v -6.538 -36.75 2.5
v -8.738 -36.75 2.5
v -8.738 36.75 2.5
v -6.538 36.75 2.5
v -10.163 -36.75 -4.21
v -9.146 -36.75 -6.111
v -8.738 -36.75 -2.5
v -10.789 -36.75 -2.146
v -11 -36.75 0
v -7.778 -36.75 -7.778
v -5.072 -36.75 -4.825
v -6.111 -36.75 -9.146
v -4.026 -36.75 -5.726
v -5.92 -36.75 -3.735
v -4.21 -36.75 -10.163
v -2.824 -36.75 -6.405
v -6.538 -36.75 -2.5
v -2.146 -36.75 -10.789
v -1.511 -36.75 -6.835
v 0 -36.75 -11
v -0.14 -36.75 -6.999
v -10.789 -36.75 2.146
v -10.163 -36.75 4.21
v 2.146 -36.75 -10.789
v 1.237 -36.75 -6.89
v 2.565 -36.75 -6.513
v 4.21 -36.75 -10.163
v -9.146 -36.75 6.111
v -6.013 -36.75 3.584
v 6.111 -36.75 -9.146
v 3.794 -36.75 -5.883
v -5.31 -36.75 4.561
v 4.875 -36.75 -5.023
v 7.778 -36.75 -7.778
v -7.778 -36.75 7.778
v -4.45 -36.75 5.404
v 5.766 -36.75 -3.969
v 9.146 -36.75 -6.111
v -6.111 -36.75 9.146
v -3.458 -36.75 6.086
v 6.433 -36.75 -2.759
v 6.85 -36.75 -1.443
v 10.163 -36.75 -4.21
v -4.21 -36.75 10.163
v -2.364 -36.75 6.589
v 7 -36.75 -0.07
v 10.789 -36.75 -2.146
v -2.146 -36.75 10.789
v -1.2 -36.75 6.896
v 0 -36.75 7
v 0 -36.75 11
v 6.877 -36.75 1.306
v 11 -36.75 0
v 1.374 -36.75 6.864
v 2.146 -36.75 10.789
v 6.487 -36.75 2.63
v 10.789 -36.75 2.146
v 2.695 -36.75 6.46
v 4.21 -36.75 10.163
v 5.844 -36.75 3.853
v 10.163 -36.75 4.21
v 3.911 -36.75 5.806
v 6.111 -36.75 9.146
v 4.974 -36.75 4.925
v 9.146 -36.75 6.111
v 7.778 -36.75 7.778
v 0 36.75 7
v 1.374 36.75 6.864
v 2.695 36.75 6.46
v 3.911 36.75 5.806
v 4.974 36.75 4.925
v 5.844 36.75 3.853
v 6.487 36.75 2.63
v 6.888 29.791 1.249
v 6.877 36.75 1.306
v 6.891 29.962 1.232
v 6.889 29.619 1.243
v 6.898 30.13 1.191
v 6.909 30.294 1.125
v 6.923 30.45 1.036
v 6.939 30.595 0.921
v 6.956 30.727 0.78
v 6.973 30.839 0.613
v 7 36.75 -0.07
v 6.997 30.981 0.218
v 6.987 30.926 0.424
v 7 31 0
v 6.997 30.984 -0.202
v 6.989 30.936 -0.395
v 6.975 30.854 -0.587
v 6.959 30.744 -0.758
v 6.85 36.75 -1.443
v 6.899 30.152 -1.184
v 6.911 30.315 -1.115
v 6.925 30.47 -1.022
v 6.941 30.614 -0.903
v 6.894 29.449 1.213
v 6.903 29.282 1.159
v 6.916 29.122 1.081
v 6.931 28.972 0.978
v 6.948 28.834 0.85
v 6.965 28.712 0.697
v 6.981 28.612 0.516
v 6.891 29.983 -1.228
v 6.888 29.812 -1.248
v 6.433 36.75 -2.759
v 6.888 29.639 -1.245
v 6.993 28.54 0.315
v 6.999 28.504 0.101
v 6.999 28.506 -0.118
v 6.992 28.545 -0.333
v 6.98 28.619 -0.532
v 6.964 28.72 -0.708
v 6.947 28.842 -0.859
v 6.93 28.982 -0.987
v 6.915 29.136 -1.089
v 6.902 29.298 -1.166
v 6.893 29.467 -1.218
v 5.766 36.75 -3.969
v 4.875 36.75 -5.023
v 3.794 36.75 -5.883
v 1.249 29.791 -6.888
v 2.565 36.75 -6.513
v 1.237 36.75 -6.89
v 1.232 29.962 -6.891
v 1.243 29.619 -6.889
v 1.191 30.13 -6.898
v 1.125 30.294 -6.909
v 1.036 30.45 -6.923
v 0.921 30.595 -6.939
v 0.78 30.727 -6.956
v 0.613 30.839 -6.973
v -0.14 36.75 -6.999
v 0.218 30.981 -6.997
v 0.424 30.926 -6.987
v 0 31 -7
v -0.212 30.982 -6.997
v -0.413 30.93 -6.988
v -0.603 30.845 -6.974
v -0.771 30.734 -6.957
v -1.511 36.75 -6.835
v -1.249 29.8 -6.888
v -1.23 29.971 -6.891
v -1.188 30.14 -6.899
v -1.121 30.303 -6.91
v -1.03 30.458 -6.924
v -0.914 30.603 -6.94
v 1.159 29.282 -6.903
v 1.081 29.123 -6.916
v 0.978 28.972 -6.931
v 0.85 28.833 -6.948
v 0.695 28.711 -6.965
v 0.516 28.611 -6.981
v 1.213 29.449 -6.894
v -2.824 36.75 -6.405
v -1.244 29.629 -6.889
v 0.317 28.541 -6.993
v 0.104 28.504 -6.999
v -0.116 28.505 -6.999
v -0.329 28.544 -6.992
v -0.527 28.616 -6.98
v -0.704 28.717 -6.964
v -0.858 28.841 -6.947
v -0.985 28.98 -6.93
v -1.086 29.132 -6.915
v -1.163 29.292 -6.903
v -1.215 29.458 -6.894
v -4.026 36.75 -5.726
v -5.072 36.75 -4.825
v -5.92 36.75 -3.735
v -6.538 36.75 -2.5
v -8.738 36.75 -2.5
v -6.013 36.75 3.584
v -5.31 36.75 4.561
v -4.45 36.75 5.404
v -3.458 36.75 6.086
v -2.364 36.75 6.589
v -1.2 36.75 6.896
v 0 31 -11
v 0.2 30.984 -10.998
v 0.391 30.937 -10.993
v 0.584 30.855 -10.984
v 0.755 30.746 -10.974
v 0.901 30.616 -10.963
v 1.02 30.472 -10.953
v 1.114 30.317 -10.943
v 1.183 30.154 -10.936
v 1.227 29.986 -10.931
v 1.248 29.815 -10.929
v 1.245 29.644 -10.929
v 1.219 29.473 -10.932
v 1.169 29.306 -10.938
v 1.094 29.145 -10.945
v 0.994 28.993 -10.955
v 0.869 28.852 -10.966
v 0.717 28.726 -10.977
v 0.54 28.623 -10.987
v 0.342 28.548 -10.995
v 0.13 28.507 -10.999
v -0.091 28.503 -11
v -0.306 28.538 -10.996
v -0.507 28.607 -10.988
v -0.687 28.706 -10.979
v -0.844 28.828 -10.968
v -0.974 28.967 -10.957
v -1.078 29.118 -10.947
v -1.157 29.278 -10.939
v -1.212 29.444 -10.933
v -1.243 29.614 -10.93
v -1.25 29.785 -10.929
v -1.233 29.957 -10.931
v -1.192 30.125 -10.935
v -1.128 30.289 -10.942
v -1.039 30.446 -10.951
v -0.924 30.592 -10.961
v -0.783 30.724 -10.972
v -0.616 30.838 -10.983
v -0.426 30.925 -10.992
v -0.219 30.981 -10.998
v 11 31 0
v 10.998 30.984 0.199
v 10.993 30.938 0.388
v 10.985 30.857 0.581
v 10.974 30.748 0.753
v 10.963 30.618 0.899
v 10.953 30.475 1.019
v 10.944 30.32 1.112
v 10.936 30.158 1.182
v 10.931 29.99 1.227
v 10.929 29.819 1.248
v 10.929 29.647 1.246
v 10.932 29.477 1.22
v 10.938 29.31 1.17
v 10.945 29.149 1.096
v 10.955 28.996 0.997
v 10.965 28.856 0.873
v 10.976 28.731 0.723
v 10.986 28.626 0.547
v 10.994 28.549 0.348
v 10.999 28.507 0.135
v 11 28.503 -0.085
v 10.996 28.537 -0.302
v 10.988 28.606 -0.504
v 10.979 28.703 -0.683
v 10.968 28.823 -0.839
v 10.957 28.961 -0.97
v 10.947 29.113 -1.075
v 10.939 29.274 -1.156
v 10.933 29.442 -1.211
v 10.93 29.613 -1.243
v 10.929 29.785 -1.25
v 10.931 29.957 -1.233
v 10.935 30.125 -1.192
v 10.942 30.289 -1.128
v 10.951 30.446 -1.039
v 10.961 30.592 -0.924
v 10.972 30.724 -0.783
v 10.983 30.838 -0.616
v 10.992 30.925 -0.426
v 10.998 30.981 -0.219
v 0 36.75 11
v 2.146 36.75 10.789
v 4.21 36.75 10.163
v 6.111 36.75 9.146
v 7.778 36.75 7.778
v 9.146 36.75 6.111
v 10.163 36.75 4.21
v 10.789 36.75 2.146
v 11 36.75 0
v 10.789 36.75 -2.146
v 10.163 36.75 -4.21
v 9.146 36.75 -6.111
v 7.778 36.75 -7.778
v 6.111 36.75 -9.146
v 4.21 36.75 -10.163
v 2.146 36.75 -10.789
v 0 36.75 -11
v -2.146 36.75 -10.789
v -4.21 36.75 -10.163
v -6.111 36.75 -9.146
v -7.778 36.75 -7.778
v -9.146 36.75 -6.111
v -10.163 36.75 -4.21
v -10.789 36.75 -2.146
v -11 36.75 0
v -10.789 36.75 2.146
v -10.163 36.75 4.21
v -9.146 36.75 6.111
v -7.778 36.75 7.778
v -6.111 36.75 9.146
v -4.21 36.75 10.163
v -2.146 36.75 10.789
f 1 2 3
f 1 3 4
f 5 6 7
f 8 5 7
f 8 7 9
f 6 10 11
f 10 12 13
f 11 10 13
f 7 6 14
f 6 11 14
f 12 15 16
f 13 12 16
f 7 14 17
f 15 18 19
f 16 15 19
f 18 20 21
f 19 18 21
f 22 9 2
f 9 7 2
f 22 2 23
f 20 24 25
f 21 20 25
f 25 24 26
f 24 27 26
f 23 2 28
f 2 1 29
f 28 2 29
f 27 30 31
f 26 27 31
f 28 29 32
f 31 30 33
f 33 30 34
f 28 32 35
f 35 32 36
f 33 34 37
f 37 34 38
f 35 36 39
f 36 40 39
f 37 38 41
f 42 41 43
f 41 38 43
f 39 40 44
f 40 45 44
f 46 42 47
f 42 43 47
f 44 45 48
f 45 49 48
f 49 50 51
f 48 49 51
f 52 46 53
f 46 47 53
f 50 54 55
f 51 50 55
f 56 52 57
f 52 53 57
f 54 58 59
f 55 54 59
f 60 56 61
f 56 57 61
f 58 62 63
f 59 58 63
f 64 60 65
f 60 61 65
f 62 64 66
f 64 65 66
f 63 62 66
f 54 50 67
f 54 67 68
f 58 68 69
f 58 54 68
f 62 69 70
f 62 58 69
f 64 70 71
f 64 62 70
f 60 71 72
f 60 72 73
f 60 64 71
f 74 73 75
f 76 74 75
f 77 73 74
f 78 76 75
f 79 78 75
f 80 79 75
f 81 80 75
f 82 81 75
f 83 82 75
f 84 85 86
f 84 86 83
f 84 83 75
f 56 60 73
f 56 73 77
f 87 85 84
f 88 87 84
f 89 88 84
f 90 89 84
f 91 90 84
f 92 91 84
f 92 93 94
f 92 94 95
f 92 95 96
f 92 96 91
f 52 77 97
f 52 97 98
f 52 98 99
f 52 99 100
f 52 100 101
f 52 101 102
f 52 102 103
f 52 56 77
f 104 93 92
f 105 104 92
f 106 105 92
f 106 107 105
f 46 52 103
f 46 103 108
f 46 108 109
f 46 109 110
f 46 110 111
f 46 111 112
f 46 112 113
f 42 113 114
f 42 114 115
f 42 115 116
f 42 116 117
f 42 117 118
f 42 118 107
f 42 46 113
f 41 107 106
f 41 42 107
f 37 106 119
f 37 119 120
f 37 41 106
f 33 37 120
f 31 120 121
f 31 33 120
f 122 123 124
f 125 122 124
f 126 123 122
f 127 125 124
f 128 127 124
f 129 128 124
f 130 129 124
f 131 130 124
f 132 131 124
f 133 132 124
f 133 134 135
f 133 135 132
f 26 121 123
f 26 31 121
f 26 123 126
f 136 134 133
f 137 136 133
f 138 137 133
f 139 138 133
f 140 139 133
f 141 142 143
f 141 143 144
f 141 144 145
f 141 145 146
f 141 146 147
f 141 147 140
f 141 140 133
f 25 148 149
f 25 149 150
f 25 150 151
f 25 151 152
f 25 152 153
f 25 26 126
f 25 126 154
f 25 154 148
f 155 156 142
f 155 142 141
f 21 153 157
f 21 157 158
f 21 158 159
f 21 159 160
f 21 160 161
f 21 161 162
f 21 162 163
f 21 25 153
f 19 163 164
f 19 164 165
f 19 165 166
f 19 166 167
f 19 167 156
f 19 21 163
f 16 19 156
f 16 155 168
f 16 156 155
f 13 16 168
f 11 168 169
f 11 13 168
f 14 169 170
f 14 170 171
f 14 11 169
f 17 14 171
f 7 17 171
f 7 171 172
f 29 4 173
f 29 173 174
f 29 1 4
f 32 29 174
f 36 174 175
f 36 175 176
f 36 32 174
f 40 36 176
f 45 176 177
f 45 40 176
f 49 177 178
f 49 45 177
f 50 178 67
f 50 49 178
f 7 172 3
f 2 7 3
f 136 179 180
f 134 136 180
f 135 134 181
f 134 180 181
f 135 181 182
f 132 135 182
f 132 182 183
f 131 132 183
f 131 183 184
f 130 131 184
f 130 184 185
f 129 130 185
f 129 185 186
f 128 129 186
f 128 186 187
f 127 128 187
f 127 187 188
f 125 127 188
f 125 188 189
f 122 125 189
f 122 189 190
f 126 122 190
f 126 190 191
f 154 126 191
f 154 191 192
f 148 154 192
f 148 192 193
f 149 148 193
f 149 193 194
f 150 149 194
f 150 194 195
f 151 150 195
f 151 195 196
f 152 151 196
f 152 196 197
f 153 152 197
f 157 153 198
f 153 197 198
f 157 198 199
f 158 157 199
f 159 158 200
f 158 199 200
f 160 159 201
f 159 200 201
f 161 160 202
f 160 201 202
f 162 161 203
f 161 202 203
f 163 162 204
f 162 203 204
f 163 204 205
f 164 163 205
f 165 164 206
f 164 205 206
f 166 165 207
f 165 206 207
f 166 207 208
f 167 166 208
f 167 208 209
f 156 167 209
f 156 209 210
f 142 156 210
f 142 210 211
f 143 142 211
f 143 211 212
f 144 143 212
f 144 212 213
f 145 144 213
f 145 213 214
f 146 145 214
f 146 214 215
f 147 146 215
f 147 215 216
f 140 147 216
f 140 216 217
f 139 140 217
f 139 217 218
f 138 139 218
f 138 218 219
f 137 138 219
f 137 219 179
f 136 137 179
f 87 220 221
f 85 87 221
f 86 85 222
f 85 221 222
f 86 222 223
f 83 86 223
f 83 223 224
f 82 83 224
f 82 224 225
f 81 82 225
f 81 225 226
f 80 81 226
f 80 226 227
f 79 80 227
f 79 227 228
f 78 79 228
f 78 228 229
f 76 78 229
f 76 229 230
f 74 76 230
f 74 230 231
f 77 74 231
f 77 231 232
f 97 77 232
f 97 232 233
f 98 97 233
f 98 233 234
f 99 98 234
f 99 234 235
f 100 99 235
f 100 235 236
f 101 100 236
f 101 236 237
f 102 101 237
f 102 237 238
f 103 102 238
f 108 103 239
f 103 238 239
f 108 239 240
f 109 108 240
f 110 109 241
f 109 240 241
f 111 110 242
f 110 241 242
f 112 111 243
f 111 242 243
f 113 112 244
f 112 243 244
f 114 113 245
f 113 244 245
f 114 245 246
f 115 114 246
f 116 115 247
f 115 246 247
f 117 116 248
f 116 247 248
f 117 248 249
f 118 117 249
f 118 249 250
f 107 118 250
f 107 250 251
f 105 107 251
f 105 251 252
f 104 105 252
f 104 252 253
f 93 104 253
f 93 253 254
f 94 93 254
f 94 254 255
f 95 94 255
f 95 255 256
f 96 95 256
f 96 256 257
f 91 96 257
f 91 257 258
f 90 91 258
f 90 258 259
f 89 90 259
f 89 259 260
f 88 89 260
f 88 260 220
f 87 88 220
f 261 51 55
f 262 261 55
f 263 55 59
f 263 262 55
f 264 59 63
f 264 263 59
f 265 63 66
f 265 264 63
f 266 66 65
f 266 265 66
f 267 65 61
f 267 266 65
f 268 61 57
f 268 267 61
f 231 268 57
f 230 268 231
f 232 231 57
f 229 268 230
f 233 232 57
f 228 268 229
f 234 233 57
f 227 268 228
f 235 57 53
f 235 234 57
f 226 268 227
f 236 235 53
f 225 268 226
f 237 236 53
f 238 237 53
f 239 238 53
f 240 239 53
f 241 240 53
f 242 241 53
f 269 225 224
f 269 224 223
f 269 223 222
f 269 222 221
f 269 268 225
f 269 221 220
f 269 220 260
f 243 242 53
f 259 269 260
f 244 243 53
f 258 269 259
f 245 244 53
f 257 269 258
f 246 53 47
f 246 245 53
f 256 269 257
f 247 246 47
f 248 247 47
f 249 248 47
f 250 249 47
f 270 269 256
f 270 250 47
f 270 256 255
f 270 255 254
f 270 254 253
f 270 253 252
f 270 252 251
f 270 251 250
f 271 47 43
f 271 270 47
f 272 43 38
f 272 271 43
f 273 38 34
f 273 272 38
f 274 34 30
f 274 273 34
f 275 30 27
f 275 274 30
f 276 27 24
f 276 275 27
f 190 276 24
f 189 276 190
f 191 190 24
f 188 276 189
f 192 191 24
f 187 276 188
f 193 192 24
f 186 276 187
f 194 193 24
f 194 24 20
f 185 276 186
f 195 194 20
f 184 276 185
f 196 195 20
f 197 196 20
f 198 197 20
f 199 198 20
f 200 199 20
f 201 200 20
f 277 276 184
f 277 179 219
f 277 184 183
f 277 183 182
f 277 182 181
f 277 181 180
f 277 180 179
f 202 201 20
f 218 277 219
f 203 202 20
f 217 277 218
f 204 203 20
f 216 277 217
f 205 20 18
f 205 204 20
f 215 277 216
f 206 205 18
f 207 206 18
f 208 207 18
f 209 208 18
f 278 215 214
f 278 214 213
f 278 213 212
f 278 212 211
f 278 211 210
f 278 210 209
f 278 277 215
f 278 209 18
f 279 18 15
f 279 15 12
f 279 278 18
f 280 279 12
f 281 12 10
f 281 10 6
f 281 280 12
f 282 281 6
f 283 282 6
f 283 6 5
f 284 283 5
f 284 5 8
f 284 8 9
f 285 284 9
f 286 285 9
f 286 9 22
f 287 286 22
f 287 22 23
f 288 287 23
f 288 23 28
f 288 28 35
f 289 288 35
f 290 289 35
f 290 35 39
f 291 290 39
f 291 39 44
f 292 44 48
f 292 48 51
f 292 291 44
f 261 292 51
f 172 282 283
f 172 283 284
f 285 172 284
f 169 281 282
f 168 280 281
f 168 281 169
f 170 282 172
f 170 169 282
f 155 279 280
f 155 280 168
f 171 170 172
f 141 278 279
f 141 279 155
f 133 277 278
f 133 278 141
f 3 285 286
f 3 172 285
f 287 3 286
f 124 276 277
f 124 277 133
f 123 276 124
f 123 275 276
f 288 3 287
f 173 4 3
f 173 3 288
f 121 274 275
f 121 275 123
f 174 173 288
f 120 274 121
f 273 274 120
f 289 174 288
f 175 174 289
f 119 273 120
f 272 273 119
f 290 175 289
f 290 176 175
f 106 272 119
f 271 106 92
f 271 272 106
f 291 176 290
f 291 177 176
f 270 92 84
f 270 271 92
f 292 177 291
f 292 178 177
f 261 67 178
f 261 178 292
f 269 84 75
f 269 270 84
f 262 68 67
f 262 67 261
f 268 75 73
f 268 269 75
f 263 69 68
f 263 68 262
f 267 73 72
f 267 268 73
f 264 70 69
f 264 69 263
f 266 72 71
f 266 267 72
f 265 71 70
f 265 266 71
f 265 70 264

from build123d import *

# Parameters (mm, degrees)
SKETCH1_R               = 11
SKETCH1_R_2             = 7
BOSS_EXTRUDE1_DEPTH     = 36.75
SKETCH2_R               = 1.25
CUT_EXTRUDE1_DEPTH      = 10
CIRPATTERN1_COUNT       = 2
CIRPATTERN1_ANGLE       = 90
CUT_EXTRUDE2_DEPTH      = 76.128223855
CUT_EXTRUDE2_DEPTH_BACK = 76.128223855


with BuildPart() as part:
    # Sketch1 → Boss-Extrude1 (new, symmetric)
    with BuildSketch(Plane(origin=(0, 0, 0), x_dir=(1, 0, 0), z_dir=(0, 1, 0))):
        with Locations(Location((0, 0, 0), (0, 0, 270))):
            Circle(SKETCH1_R)
        with Locations(Location((0, 0, 0), (0, 0, 270))):
            Circle(SKETCH1_R_2, mode=Mode.SUBTRACT)
    extrude(amount=BOSS_EXTRUDE1_DEPTH, both=True)

    # Sketch2 → Cut-Extrude1 (cut)
    with BuildSketch(Plane(origin=(0, 0, -11), x_dir=(-1, 0, 0), z_dir=(0, 0, -1))):
        with Locations(Location((0, 29.75, 0), (0, 0, 90))):
            Circle(SKETCH2_R)
    cut_extrude1 = extrude(amount=-CUT_EXTRUDE1_DEPTH, mode=Mode.SUBTRACT)

    # CirPattern1: Cut-Extrude1 ×2 about axis
    cirpattern1_axis = Axis((0, 36.75, 0), (0, -1, 0))
    for i in range(1, CIRPATTERN1_COUNT):
        add(cut_extrude1.rotate(cirpattern1_axis, i * CIRPATTERN1_ANGLE / (CIRPATTERN1_COUNT - 1)), mode=Mode.SUBTRACT)

    # Sketch4 → Cut-Extrude2 (cut, two sides: drawn at the far end of the back side and taken through both)
    with BuildSketch(Plane(origin=(0, 36.75, 0), x_dir=(1, 0, 0), z_dir=(0, 1, 0)).offset(-CUT_EXTRUDE2_DEPTH_BACK)):
        with BuildLine():
            ThreePointArc((-6.565325544, 2.428271092), (-6.551935139, 2.464172464), (-6.538348415, 2.5))
            Line((-6.538348415, 2.5), (-8.738348415, 2.5))
            Line((-8.738348415, 2.5), (-8.738348415, -2.5))
            Line((-8.738348415, -2.5), (-6.538348415, -2.5))
            ThreePointArc((-6.538348415, -2.5), (-6.999895128, -0.038317104), (-6.565325544, 2.428271092))
        make_face()
    extrude(amount=CUT_EXTRUDE2_DEPTH + CUT_EXTRUDE2_DEPTH_BACK, mode=Mode.SUBTRACT)


solid = part.part
